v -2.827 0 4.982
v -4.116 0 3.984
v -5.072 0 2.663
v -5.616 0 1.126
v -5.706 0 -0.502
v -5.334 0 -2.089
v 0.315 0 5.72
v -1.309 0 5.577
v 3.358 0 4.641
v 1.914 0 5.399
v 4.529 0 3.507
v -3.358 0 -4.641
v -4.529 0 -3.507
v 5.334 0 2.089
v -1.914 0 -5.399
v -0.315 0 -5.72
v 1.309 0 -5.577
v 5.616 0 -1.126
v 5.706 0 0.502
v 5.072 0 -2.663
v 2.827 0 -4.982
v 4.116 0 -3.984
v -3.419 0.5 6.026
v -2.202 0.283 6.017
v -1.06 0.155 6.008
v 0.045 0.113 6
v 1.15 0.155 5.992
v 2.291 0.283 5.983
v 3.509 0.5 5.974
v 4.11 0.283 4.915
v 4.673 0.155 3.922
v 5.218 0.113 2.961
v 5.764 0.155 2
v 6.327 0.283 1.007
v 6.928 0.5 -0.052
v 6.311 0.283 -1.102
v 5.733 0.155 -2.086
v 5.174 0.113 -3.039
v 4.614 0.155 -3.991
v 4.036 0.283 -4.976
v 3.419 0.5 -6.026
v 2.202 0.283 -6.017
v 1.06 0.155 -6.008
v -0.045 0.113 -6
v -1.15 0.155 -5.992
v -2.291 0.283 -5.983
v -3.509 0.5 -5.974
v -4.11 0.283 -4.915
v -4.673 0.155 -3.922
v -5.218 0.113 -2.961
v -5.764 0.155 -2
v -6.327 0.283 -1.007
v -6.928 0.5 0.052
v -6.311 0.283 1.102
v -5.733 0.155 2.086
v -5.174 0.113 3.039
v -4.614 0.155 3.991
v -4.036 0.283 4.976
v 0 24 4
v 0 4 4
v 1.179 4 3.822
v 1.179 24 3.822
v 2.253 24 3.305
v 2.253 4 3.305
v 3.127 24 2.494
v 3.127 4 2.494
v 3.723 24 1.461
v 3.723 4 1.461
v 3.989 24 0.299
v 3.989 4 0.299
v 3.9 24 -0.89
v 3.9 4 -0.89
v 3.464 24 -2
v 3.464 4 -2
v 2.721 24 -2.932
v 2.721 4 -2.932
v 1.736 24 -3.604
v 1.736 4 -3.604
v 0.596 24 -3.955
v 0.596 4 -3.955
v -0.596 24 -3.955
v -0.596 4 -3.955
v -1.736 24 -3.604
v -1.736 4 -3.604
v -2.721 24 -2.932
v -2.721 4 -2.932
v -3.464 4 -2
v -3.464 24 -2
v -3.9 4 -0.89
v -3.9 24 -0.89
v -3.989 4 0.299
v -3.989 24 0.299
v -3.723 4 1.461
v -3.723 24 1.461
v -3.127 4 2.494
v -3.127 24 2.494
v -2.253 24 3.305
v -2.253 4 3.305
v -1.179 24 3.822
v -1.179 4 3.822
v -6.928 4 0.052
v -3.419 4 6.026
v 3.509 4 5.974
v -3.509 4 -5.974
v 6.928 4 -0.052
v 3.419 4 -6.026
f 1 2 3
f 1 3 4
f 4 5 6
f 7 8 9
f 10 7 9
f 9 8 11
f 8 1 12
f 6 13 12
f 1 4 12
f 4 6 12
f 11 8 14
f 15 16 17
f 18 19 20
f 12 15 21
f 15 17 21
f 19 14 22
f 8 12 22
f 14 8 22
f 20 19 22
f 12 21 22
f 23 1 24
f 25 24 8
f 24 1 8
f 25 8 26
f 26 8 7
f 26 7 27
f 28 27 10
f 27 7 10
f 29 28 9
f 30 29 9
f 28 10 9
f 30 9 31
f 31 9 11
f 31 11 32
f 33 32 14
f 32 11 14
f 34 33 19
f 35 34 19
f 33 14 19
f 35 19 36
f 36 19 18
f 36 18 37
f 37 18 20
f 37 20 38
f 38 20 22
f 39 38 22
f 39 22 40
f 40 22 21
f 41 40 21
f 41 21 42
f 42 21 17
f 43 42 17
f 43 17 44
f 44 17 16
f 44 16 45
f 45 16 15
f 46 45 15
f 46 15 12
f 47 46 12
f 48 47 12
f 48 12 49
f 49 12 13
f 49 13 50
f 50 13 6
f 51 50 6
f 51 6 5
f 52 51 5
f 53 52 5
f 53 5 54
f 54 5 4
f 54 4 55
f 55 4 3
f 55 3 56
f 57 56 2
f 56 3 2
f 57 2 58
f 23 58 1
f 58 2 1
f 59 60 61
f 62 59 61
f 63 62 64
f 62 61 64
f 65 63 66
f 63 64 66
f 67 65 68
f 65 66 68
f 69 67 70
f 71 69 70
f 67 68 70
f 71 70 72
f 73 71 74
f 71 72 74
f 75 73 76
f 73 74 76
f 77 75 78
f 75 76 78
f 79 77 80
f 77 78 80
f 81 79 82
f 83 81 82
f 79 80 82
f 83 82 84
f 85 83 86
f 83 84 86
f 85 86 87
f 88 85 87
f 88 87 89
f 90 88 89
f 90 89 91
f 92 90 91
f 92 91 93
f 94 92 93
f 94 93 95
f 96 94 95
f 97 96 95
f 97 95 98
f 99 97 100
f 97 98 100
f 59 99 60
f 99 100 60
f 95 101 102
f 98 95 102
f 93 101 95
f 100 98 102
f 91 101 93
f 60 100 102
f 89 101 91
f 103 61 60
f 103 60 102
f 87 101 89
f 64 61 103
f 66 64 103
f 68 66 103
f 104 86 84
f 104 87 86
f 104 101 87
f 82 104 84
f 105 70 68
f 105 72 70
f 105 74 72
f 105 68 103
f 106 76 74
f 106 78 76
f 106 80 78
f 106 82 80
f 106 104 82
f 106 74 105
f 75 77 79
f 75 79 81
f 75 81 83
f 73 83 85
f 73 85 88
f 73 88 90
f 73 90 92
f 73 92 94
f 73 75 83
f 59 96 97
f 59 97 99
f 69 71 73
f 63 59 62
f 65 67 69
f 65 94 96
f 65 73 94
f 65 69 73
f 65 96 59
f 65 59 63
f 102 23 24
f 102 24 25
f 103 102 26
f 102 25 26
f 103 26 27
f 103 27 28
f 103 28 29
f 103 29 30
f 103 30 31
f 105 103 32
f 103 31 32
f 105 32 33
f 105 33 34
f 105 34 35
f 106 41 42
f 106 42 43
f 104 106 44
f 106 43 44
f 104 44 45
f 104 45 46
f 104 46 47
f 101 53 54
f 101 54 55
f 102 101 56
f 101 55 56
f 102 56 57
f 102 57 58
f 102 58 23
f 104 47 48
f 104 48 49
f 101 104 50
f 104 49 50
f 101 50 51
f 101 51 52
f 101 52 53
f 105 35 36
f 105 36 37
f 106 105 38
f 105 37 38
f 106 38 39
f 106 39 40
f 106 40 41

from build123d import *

# Parameters (mm, degrees)
EXTRUDE_1_DEPTH = 4
SKETCH_2_R      = 4
EXTRUDE_2_DEPTH = 20


with BuildPart() as part:
    # 草图1 → 凸台-拉伸1 (new body)
    with BuildSketch(Plane(origin=(0, 0, 0), x_dir=(1, 0, 0), z_dir=(0, 1, 0))):
        Polygon((3.419107318, 6.025753492), (-3.508901942, 5.973910542), (-6.92800926, -0.05184295), (-3.419107318, -6.025753492), (3.508901942, -5.973910542), (6.92800926, 0.05184295), align=None)
    extrude(amount=EXTRUDE_1_DEPTH)

    # 草图2 → 凸台-拉伸2 (add)
    with BuildSketch(Plane(origin=(0, 4, 0), x_dir=(1, 0, 0), z_dir=(0, 1, 0))):
        with Locations(Location((0, 0, 0), (0, 0, 270))):
            Circle(SKETCH_2_R)
    extrude(amount=EXTRUDE_2_DEPTH)

    # 草图5 → 切除-旋转3 (revolve, cut)
    with BuildSketch(Plane(origin=(0, 0, 0), x_dir=(0.4935056326713254, 0, -0.8697426001534447), z_dir=(0.8697426001534447, 0, 0.4935056326713254)), mode=Mode.PRIVATE) as cut_revolve_3_sk:
        Polygon((6.92820323, 0.5), (5.72820323, 0), (6.92820323, 0), align=None)
    revolve(cut_revolve_3_sk.sketch.rotate(Axis((0, -1000, 0), (0, 1, 0)), 179.999999998), axis=Axis((0, -1000, 0), (0, 1, 0)), mode=Mode.SUBTRACT)


solid = part.part
